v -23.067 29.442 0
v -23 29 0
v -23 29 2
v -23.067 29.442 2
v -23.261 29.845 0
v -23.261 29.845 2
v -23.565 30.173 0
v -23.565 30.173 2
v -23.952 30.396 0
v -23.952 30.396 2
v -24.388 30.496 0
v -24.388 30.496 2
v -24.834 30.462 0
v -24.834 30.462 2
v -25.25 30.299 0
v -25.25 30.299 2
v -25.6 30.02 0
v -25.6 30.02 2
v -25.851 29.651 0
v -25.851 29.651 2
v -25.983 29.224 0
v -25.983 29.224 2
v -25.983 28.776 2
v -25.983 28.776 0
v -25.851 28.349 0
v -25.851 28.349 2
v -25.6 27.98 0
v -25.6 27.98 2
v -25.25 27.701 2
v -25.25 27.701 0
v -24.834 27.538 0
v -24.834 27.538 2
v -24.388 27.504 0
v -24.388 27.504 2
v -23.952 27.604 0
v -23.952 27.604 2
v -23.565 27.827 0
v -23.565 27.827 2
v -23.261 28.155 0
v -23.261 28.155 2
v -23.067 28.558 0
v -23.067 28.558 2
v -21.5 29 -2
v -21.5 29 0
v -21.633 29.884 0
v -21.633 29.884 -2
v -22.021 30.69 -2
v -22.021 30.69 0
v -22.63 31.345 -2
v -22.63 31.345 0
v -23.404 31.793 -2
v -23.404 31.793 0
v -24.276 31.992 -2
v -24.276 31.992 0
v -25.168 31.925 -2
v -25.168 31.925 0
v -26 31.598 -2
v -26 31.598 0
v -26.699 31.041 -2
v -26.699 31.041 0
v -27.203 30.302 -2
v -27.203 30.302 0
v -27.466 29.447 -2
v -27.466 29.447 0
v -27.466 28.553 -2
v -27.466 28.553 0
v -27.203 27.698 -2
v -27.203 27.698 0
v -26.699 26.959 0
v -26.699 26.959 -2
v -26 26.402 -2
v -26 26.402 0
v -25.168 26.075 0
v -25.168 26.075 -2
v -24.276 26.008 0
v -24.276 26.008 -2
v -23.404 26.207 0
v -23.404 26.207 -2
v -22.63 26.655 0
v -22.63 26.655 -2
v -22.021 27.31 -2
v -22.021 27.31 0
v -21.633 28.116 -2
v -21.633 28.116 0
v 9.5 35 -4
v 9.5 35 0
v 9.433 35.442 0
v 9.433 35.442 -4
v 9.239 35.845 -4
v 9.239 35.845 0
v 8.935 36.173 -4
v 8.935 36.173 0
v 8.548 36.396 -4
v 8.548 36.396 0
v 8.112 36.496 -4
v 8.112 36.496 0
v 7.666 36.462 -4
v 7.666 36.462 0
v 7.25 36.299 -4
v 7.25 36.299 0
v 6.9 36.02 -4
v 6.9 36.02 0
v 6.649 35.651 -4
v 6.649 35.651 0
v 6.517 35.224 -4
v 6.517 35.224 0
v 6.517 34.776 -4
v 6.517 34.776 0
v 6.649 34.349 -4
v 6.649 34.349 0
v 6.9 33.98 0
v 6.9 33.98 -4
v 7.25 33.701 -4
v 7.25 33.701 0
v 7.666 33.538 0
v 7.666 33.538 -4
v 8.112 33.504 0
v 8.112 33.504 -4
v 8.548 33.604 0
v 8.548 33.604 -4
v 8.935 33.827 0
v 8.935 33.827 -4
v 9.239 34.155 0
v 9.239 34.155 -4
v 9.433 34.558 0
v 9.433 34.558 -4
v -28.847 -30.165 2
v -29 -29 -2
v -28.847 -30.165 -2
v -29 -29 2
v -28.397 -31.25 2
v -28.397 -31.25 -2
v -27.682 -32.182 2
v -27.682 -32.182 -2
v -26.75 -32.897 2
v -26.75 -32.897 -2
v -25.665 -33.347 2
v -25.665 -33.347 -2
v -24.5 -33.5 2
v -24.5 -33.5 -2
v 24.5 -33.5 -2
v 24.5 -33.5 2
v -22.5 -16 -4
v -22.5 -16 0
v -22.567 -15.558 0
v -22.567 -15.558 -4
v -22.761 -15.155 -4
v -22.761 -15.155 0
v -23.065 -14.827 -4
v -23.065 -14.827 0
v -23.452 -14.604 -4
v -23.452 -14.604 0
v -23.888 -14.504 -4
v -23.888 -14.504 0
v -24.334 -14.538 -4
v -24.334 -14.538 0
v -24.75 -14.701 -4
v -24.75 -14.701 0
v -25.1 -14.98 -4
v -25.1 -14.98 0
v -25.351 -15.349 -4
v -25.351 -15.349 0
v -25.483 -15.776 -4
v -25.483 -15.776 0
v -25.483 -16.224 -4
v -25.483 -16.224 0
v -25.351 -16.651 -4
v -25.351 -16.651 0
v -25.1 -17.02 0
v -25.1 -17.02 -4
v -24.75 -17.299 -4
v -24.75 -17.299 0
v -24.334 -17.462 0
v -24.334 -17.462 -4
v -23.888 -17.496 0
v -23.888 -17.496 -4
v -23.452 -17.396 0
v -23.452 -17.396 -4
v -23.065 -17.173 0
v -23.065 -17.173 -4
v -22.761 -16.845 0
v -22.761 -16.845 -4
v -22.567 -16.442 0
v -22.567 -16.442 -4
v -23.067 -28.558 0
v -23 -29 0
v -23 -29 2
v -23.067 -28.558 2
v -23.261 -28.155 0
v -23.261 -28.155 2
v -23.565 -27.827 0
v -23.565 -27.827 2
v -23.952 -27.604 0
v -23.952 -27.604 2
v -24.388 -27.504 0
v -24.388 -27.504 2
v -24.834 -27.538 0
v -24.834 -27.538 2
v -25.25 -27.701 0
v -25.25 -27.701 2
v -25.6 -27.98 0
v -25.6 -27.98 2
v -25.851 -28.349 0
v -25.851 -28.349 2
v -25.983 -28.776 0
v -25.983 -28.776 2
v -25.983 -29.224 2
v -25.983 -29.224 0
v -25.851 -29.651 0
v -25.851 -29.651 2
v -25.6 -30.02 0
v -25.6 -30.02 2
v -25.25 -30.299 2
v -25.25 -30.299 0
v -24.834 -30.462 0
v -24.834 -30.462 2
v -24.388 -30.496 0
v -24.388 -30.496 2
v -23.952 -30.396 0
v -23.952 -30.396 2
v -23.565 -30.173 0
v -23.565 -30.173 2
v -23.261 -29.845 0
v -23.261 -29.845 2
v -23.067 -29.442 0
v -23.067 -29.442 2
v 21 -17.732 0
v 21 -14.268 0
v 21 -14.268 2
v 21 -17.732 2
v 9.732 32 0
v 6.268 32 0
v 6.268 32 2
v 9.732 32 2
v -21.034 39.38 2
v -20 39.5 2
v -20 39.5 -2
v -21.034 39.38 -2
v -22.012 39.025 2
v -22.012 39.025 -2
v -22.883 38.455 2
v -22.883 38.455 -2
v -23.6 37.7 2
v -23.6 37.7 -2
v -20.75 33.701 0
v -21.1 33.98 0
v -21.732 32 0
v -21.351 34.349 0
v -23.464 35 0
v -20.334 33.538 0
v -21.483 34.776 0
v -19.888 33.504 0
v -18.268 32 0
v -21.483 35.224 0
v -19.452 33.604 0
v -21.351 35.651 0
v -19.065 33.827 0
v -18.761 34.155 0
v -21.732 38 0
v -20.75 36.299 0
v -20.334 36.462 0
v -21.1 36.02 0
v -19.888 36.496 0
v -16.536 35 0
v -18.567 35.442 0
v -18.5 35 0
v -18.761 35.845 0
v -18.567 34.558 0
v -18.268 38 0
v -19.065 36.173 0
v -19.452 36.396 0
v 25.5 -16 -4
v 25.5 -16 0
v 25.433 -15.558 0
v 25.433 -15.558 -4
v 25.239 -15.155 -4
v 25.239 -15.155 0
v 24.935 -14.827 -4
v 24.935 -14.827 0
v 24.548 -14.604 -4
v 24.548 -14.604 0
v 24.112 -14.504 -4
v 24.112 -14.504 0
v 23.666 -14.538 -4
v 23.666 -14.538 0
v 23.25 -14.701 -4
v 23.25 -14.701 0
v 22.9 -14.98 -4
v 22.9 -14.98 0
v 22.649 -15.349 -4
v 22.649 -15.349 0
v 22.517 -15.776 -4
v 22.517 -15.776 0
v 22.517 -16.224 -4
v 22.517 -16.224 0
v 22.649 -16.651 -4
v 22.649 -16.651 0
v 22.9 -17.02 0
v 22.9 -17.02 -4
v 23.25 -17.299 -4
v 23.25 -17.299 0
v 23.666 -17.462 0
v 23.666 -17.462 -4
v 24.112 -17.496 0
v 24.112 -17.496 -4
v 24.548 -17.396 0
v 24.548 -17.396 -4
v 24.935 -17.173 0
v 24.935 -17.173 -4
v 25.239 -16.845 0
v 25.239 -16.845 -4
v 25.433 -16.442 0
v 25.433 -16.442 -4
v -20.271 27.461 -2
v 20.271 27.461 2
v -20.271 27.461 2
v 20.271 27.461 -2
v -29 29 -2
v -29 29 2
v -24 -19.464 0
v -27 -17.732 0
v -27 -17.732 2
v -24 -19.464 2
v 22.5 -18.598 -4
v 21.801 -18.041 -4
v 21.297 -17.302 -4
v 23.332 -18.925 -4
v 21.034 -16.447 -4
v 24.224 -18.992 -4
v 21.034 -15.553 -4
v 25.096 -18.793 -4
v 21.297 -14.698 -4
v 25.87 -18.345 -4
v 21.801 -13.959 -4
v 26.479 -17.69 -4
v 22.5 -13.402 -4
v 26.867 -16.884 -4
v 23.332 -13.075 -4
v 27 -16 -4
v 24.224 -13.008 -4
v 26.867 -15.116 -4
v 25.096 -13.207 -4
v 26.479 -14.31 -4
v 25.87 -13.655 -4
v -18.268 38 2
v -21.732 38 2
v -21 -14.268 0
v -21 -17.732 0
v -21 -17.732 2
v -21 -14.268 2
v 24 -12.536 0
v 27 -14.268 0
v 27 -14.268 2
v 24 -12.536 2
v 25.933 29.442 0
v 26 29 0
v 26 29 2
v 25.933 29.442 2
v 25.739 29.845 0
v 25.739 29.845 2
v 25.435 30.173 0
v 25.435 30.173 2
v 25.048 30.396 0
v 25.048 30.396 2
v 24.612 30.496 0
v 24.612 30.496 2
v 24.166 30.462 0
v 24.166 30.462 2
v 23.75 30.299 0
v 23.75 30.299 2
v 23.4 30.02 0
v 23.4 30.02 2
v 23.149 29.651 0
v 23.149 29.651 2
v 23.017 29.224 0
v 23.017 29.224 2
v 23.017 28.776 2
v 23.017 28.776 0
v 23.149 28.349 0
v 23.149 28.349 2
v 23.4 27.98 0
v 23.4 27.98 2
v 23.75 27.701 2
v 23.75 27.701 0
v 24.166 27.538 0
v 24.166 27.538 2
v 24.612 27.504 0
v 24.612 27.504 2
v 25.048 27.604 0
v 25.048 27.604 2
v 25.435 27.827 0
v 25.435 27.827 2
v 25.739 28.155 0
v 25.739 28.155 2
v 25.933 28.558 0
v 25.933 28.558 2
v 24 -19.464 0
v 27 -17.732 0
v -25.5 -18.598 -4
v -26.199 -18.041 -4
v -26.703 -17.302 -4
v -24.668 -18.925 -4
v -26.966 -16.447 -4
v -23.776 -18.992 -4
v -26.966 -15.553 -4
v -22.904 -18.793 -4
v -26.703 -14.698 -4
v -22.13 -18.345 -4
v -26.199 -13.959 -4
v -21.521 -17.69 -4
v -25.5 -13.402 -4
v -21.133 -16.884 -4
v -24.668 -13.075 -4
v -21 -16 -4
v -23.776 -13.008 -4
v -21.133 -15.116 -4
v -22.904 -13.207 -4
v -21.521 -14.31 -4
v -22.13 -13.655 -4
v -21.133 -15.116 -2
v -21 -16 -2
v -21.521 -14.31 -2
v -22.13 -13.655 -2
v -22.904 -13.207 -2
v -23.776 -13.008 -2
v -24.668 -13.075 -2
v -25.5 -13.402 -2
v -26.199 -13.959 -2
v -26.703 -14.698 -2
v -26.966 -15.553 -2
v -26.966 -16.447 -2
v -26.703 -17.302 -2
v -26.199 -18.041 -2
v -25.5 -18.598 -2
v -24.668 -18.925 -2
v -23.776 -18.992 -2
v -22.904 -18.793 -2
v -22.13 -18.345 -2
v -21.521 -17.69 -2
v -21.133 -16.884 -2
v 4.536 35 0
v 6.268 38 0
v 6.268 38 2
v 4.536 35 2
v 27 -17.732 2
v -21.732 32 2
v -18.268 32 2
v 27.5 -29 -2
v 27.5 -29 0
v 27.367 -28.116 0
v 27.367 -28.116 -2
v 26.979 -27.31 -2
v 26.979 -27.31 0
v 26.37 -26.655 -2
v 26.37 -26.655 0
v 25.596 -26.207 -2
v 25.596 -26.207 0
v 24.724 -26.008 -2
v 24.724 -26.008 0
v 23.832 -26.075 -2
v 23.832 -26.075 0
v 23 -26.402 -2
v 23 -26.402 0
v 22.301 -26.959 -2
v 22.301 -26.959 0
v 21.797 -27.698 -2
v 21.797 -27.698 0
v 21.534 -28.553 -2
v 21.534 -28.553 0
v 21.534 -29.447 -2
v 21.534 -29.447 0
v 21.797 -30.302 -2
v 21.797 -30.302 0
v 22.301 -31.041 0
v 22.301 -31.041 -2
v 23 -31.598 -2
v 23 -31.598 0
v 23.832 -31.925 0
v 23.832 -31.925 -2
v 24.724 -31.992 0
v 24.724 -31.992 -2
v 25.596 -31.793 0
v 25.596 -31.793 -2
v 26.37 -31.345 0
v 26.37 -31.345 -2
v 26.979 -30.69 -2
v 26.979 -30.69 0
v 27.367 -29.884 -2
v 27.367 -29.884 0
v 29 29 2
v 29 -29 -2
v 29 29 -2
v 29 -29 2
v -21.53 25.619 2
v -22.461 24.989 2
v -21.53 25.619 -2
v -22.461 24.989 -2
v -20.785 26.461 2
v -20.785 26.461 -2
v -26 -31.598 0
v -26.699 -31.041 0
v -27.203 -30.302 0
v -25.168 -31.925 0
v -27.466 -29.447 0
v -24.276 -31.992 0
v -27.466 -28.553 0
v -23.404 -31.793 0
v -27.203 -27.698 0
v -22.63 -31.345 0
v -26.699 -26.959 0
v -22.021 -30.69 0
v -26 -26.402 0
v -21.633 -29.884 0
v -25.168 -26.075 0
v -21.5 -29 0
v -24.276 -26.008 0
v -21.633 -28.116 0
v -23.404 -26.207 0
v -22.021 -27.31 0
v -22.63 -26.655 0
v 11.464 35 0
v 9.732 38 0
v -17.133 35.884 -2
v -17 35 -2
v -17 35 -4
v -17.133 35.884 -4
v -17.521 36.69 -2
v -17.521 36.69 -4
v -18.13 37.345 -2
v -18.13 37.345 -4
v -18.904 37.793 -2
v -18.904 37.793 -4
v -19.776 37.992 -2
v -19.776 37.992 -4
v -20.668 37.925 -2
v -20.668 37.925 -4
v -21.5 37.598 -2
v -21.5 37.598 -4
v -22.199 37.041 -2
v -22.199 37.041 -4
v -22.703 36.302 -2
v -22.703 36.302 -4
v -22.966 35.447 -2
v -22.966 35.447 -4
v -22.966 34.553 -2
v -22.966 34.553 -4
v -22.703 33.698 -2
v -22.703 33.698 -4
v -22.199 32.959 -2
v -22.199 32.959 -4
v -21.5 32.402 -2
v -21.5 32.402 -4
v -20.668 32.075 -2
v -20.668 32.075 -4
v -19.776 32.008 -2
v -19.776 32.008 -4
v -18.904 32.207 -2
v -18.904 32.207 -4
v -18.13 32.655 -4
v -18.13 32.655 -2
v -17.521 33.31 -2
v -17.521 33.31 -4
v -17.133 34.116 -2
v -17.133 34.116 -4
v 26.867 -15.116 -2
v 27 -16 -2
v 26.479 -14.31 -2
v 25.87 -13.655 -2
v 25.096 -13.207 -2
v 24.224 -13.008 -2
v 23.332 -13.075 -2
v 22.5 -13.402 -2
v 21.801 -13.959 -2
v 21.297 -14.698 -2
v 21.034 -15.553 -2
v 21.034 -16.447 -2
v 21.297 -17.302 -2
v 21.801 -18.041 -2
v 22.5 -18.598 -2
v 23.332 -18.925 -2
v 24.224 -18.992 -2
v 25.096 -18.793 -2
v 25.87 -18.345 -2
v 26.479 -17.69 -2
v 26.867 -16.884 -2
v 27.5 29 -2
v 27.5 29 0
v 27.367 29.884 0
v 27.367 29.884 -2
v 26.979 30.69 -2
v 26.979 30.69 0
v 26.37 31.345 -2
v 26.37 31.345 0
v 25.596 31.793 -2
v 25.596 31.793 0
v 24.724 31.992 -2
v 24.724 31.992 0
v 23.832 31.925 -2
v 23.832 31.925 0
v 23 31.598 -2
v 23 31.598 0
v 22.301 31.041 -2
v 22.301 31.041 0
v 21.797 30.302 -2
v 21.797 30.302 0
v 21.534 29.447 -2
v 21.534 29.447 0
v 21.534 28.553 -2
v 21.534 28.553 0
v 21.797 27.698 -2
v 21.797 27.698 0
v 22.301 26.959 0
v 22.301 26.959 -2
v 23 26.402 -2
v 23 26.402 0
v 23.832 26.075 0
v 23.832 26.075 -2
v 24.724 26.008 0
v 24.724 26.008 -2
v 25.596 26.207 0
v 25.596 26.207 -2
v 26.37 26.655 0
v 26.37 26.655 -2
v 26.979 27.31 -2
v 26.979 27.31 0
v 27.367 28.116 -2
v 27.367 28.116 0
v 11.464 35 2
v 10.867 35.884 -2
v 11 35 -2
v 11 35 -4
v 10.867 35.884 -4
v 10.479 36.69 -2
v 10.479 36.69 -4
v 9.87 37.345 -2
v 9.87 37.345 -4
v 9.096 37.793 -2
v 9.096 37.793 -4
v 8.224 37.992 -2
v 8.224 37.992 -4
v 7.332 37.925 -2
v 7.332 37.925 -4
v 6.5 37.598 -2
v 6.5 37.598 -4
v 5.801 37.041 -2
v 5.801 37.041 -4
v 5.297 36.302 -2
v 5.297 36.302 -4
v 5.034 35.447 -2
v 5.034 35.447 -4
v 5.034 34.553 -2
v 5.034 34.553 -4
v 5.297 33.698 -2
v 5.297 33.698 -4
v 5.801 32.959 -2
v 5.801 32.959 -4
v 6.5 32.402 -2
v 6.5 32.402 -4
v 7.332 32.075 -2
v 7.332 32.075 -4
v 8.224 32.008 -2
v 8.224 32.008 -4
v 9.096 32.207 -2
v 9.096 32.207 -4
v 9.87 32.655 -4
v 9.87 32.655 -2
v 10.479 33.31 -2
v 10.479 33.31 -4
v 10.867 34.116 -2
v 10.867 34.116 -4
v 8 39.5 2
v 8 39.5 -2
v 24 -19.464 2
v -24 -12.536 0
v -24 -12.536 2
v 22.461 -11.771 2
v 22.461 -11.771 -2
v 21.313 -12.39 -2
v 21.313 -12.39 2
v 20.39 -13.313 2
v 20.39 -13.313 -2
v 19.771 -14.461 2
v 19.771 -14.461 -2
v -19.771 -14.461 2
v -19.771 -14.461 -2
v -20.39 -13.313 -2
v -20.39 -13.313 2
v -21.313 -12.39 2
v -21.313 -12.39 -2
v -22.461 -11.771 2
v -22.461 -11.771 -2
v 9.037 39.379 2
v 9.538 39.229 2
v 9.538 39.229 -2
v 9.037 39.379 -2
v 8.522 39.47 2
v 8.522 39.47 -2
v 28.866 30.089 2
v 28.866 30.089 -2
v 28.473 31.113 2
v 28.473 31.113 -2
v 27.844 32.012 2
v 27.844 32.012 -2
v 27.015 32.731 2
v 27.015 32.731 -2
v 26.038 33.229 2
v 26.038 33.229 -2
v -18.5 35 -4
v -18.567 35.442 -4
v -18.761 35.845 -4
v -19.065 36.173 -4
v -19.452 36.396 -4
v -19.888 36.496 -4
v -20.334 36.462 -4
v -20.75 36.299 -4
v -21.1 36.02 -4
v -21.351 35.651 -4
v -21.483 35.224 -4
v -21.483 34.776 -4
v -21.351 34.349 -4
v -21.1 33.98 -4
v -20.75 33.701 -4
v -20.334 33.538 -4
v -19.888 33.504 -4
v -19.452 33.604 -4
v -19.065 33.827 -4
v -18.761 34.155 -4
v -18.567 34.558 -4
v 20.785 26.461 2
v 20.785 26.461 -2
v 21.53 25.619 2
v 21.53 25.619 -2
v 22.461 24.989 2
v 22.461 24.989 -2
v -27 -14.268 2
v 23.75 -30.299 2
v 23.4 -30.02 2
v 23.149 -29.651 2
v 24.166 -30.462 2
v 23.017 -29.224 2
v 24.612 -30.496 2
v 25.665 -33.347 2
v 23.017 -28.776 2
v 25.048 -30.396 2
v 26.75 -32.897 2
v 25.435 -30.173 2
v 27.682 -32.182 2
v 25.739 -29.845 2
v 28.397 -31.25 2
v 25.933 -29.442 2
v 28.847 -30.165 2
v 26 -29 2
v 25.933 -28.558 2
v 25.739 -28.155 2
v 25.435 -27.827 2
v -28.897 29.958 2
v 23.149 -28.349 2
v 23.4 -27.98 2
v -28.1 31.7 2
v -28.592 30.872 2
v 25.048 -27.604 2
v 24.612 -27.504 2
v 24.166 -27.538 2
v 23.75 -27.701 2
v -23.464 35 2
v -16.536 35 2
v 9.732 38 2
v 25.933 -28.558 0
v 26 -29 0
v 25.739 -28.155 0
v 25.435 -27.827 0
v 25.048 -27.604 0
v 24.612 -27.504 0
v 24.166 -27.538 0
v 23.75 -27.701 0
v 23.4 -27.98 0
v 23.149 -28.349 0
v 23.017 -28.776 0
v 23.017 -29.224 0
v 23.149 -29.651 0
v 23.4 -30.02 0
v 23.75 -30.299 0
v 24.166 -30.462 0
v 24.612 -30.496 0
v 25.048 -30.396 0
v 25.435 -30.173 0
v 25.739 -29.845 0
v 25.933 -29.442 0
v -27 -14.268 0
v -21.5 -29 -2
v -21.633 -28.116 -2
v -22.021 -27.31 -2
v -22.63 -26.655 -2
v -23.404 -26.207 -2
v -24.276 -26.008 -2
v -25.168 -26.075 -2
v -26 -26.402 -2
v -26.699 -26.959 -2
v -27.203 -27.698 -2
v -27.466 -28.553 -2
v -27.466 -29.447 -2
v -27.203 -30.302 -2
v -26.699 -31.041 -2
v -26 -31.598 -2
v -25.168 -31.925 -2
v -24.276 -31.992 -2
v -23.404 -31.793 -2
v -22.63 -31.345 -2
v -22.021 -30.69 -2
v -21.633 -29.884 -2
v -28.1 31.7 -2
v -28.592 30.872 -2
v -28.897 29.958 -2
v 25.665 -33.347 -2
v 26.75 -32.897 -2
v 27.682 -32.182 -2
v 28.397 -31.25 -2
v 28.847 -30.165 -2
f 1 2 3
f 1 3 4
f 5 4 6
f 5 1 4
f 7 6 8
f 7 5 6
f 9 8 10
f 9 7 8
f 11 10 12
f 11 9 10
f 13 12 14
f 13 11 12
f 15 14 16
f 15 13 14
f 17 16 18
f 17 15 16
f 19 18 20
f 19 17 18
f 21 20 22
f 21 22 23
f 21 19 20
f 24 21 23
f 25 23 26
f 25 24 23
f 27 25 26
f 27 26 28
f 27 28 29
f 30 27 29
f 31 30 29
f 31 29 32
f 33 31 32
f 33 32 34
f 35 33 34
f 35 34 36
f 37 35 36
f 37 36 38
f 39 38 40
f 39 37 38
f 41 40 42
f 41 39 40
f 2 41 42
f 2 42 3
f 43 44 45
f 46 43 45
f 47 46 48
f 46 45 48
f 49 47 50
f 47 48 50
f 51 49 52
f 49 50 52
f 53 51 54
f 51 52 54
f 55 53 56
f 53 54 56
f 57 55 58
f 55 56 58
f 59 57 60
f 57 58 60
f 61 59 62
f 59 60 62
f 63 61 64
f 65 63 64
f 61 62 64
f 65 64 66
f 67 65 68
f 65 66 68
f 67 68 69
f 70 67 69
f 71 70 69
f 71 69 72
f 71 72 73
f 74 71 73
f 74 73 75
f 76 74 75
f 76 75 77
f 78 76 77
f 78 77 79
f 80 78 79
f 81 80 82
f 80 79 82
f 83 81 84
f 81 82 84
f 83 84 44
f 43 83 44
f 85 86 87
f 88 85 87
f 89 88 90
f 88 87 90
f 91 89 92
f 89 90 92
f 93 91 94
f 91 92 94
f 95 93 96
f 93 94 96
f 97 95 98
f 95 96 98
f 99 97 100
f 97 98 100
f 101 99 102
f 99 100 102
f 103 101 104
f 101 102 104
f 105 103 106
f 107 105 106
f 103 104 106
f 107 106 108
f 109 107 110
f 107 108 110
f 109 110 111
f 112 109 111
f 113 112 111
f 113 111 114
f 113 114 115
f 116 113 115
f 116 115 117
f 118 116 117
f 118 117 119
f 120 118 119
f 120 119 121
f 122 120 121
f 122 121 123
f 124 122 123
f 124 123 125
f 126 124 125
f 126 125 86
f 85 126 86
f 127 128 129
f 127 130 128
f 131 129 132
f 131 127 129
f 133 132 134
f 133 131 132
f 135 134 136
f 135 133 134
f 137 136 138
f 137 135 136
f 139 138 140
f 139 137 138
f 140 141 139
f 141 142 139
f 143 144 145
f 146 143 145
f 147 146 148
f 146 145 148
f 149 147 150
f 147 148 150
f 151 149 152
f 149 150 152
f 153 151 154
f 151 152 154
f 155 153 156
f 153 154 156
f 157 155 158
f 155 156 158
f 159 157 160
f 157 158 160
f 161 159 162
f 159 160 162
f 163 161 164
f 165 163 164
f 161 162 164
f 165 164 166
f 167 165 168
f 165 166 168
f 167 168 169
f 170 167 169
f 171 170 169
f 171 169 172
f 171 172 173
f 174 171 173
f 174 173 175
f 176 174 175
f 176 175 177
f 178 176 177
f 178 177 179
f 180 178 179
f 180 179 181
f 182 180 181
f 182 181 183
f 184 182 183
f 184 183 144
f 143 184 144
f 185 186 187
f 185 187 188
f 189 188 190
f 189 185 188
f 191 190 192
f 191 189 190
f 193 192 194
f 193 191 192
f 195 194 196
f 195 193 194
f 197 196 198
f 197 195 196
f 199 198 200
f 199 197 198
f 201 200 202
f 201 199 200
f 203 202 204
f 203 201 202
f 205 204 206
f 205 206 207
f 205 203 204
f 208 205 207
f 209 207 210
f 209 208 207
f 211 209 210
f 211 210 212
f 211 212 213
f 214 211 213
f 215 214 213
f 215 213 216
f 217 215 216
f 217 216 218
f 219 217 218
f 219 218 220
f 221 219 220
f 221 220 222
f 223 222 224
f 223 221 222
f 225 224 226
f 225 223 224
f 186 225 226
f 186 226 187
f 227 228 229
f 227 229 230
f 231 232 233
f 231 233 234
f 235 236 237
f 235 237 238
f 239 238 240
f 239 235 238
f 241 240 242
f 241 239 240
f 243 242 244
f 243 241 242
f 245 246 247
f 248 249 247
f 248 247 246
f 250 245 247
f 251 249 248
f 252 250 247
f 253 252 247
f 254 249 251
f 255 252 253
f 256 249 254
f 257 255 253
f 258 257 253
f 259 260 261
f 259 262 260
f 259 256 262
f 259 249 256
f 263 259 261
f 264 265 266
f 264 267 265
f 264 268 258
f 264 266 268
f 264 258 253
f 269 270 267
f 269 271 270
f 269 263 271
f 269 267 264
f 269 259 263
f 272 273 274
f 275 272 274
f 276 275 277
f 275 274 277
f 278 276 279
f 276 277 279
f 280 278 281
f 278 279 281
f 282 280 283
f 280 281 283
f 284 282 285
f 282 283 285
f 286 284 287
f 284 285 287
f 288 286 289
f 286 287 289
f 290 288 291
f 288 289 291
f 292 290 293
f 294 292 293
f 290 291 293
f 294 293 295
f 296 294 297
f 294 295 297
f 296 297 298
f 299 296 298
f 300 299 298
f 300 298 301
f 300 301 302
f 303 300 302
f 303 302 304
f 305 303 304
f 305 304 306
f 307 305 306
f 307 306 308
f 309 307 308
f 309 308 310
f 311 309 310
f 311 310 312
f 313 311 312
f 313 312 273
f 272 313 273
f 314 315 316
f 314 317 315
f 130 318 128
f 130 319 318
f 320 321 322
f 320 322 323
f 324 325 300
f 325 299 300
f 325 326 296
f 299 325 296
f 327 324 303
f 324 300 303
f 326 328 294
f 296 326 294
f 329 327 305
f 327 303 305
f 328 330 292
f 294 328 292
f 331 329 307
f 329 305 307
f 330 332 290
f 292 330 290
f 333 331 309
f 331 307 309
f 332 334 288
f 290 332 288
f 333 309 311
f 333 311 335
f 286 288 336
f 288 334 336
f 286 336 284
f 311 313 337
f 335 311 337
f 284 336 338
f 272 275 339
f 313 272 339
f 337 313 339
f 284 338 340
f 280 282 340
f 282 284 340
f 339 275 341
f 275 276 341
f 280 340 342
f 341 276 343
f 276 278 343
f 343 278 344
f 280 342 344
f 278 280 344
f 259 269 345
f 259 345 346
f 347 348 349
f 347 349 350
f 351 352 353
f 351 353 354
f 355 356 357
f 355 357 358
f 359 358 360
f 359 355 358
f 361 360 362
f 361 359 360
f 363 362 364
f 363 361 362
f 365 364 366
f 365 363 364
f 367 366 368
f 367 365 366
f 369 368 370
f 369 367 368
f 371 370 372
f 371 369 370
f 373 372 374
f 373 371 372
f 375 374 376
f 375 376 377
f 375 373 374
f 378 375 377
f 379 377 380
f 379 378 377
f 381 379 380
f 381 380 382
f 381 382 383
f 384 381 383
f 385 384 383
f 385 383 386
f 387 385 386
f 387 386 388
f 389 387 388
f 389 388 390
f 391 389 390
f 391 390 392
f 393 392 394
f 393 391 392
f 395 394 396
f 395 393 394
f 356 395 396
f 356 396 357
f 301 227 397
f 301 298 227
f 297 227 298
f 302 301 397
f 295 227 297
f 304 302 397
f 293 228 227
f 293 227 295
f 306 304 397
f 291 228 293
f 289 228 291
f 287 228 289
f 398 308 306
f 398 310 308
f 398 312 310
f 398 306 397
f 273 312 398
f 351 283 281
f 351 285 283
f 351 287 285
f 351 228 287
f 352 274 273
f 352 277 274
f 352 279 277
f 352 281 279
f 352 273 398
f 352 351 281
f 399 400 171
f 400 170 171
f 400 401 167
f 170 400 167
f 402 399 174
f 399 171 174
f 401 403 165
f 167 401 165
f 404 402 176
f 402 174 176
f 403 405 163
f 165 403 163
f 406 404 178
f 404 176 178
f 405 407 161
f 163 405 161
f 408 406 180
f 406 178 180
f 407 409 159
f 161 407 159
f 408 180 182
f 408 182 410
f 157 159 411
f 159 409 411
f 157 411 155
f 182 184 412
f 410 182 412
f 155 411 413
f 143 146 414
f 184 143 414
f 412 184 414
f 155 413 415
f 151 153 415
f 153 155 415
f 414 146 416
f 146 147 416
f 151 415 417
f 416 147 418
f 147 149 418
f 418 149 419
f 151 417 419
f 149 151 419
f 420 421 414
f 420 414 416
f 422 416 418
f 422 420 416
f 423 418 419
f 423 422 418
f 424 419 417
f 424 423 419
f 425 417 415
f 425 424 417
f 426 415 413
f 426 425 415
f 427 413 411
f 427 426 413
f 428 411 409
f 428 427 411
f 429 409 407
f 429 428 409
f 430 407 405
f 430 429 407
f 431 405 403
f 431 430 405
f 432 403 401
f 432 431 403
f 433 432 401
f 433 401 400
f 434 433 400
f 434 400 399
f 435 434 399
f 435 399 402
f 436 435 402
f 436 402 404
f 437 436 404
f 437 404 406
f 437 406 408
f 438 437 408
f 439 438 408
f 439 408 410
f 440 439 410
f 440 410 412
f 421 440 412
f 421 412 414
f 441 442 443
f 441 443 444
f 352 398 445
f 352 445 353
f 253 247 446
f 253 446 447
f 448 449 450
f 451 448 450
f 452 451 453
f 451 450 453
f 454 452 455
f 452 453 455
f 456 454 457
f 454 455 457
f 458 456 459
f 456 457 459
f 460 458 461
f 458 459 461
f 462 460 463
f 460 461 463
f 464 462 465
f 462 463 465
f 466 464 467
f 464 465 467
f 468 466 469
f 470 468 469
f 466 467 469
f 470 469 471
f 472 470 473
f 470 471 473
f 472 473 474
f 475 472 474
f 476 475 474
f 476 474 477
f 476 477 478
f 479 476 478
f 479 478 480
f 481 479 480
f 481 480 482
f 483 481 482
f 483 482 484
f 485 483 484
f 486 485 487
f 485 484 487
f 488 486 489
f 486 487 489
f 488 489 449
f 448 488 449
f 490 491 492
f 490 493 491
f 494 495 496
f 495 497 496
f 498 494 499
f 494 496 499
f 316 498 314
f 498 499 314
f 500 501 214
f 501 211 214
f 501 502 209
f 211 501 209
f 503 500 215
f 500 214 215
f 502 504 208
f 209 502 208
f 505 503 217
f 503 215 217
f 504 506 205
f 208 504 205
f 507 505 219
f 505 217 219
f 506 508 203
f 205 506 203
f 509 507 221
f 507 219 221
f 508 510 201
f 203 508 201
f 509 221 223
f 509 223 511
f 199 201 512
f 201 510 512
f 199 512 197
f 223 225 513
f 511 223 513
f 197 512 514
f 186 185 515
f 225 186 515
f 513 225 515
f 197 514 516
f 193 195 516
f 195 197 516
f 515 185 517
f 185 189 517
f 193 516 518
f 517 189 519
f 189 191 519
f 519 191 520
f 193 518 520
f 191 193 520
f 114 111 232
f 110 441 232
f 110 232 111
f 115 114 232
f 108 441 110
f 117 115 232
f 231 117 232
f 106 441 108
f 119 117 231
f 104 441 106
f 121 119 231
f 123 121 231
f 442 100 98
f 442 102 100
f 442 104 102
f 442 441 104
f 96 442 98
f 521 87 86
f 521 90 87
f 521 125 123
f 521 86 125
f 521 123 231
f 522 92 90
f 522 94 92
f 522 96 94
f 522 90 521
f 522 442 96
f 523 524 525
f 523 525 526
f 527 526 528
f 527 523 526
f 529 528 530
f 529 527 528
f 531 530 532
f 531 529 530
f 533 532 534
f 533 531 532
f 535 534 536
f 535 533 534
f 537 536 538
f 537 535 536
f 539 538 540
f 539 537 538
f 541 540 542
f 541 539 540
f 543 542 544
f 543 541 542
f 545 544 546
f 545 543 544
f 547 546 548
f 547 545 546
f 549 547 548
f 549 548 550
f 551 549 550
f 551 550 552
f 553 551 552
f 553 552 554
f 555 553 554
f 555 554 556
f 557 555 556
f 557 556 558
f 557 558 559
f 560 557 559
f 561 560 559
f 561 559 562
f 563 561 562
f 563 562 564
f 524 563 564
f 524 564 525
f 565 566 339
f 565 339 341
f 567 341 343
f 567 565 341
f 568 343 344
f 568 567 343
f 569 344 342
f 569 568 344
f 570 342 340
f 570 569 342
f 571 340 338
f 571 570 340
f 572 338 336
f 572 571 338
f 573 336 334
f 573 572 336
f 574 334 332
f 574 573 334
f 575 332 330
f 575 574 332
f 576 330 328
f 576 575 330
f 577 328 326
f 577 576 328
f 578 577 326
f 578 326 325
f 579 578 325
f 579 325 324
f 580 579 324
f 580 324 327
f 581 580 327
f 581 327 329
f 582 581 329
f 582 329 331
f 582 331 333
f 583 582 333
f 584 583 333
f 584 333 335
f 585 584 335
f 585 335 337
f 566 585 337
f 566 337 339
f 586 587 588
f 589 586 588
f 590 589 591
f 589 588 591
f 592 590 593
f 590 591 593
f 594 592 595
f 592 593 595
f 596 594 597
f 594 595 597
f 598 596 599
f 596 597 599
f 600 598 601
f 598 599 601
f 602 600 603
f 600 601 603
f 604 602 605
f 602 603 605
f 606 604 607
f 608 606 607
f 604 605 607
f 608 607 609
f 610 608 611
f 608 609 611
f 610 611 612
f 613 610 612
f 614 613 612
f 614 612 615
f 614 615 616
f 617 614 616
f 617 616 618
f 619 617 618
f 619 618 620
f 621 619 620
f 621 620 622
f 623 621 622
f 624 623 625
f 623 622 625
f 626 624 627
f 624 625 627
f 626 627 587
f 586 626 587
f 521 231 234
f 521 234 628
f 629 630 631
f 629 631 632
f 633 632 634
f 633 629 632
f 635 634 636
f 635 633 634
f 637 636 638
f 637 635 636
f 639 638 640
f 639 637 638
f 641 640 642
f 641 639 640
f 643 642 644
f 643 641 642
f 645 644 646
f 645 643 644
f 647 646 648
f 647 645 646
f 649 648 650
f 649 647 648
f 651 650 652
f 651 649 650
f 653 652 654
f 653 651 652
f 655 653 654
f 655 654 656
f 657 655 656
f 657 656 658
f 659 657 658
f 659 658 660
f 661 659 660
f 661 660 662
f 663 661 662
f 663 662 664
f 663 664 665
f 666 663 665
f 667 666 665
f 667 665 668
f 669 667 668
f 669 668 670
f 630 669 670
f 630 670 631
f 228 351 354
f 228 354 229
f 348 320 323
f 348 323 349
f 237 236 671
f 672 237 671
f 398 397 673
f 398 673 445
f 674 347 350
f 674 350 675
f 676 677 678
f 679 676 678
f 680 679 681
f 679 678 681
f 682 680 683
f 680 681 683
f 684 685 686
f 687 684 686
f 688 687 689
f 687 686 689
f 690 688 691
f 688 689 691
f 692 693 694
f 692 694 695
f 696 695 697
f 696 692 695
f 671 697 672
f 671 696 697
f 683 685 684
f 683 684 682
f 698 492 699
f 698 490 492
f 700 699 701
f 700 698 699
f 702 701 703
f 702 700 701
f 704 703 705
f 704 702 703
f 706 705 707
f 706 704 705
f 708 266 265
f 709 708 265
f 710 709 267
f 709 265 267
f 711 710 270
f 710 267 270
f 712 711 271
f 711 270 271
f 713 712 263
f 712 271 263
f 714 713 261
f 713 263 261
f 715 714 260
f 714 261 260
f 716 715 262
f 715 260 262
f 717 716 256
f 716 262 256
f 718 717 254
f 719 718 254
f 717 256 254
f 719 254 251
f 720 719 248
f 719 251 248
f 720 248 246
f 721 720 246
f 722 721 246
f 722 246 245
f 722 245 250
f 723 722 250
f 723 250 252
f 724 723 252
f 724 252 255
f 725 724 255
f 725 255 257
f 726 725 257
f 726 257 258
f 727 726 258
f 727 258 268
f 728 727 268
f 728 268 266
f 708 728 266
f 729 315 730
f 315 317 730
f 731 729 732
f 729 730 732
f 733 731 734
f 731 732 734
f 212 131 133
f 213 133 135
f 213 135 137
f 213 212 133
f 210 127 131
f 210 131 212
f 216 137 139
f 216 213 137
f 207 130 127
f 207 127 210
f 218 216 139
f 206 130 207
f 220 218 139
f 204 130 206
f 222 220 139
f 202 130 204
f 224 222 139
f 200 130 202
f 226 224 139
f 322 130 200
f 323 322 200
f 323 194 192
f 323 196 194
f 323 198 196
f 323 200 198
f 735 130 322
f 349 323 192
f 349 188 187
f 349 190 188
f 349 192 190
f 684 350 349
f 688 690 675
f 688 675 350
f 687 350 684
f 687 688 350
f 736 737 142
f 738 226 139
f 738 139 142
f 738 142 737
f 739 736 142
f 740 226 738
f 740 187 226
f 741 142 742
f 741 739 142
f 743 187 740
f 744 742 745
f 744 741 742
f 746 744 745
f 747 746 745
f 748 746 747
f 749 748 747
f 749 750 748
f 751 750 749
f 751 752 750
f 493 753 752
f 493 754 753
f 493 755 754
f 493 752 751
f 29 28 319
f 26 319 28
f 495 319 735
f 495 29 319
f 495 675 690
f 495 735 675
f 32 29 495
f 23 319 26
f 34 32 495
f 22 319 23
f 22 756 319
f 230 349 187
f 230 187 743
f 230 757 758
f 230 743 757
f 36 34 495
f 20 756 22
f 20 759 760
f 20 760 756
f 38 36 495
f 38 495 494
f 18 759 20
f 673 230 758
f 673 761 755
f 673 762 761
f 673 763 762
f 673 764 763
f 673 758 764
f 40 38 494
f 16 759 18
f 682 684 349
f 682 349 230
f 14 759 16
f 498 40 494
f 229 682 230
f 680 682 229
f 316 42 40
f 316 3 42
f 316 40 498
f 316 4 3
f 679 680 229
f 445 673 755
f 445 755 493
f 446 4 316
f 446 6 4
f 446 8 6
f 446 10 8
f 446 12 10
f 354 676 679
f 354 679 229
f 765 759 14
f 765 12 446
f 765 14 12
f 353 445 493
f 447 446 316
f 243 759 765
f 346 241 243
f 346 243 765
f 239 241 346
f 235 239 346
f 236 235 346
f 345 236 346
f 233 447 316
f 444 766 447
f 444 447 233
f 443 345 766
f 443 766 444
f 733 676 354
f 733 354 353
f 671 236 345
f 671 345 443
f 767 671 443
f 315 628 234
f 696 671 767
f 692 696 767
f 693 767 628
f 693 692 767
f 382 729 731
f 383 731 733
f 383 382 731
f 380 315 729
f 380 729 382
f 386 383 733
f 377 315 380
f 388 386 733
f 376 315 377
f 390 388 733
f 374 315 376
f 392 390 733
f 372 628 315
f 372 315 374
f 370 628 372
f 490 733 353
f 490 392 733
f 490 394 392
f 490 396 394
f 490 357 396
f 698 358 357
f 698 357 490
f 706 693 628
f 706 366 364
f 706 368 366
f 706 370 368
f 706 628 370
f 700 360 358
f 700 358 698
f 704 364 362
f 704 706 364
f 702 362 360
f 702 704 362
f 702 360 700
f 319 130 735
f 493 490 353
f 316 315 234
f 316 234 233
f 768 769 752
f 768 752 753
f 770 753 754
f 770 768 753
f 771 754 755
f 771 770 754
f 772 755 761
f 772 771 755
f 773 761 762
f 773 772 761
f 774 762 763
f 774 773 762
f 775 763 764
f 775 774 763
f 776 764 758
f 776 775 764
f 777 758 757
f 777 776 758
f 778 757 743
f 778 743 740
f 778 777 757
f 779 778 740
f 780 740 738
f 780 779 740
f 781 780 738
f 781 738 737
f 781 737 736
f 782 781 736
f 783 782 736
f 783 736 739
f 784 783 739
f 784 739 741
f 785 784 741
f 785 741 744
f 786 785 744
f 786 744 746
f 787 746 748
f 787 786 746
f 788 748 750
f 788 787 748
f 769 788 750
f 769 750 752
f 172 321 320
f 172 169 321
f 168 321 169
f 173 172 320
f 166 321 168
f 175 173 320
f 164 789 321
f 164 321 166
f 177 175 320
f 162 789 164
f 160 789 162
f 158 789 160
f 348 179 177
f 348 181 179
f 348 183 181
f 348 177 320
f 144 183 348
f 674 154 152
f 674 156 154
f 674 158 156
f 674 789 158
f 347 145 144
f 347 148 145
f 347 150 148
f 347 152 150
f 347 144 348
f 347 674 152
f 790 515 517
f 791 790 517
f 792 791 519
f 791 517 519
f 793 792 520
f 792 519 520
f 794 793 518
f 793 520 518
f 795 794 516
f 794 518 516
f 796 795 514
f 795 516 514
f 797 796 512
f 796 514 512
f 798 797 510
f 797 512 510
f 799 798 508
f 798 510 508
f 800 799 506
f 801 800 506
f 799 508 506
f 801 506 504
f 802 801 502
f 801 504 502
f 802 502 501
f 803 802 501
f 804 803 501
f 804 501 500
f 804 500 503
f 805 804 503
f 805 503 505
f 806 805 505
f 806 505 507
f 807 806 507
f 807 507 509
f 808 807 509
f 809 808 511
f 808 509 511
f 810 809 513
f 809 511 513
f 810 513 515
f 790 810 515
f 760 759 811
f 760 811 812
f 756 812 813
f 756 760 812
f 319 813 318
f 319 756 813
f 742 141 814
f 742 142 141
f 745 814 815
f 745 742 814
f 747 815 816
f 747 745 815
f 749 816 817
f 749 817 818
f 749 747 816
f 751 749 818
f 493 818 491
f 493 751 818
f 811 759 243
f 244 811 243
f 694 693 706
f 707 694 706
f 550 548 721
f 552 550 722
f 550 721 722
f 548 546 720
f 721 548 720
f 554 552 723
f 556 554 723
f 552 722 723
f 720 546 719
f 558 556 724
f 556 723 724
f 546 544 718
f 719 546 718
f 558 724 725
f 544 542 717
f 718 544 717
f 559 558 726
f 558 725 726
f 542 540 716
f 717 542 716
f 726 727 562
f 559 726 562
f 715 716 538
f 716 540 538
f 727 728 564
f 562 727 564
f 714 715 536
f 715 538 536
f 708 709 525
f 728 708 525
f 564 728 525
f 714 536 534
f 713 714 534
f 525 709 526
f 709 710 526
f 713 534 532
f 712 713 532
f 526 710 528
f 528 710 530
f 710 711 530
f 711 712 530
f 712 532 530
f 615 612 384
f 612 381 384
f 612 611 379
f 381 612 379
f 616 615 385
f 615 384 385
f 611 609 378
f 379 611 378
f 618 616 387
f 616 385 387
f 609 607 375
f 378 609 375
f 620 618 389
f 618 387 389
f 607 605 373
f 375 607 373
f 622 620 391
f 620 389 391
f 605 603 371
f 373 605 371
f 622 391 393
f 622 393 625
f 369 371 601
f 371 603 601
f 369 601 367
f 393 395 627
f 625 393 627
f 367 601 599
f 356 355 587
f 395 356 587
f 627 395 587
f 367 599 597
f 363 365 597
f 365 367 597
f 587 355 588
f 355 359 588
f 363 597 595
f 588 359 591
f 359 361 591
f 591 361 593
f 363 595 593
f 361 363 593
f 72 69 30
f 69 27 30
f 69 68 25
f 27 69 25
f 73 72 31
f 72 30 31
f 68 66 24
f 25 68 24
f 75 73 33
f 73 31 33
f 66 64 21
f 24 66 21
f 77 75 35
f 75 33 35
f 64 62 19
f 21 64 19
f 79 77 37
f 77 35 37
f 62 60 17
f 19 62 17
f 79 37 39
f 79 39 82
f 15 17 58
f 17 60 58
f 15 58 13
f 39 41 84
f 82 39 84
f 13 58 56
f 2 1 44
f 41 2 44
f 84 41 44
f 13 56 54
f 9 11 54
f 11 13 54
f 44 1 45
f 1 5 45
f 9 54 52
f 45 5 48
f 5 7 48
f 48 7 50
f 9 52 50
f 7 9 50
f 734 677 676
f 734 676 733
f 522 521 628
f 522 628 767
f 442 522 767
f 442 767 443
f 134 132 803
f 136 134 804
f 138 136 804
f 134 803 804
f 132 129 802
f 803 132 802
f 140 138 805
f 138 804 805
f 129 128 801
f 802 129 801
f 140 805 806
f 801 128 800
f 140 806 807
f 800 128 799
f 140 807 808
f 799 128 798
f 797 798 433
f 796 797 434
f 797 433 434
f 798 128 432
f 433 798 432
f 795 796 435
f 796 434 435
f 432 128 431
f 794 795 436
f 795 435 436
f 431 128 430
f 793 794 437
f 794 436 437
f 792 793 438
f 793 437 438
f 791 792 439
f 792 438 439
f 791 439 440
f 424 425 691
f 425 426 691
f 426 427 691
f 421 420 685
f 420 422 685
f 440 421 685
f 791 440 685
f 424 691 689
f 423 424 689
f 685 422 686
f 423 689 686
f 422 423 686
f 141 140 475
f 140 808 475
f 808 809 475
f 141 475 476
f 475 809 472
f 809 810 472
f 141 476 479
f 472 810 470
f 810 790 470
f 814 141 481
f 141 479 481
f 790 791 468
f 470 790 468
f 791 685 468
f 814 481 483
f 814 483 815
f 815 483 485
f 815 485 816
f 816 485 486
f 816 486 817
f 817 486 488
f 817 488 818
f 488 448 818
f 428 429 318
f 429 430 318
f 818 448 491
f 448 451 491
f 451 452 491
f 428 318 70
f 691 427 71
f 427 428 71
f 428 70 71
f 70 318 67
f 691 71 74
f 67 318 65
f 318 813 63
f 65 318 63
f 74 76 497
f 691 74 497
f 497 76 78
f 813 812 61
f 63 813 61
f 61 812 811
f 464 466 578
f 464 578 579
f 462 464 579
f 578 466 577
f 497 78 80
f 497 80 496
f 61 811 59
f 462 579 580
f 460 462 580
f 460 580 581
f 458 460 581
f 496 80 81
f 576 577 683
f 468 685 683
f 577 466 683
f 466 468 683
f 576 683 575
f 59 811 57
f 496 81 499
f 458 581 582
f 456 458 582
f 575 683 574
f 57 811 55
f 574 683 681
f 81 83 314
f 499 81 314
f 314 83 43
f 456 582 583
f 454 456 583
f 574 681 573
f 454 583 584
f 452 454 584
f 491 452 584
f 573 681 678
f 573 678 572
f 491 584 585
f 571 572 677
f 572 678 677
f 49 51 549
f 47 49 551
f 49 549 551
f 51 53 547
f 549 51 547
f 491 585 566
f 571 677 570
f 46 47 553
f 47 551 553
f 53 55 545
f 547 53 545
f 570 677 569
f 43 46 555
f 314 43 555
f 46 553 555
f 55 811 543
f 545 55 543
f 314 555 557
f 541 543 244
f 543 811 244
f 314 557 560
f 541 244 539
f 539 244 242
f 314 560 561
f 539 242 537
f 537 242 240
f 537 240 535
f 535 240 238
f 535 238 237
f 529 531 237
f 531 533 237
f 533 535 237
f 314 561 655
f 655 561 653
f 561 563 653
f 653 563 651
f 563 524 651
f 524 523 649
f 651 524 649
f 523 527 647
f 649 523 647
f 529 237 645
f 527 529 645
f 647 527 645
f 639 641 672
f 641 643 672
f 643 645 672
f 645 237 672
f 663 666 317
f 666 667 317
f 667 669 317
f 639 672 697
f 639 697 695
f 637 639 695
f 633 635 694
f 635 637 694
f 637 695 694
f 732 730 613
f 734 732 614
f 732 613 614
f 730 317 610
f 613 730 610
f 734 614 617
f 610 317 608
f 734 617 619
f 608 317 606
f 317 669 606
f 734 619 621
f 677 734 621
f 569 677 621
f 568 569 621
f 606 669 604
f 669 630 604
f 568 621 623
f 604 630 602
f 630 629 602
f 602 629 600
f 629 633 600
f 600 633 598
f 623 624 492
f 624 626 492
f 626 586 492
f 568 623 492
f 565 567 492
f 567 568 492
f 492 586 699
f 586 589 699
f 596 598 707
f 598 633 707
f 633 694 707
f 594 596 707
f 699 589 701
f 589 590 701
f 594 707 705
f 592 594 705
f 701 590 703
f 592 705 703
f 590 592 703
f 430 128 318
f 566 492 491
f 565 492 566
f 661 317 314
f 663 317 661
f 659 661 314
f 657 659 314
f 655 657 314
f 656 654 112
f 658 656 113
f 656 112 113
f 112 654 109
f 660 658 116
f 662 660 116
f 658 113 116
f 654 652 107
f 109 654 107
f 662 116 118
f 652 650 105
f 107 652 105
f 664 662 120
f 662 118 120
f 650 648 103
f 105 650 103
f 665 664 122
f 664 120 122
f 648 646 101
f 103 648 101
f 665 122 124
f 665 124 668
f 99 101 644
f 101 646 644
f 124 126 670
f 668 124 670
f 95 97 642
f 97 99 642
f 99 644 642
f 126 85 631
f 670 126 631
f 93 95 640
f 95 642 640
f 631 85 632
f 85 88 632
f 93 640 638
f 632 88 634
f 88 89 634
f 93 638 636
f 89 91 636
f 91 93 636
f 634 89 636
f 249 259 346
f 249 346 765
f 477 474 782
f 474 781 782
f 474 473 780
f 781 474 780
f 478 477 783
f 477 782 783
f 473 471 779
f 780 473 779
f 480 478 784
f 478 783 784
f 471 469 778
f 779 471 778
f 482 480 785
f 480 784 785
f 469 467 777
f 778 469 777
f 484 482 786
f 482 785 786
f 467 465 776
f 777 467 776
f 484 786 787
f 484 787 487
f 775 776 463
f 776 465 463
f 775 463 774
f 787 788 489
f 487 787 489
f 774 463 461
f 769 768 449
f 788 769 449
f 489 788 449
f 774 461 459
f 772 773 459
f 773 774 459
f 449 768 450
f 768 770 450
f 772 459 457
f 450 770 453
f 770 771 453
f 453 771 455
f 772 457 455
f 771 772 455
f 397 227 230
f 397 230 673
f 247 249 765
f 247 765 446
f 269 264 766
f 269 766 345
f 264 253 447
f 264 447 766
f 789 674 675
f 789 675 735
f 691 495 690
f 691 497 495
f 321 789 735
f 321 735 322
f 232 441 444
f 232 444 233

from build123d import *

# Parameters (mm, degrees)
SKETCH_R        = 1.5
PAD_DEPTH       = 2
PAD_DEPTH_BACK  = 2
SKETCH001_R     = 3
SKETCH001_R_2   = 1.5
POCKET_DEPTH    = 2
SKETCH002_R     = 3
SKETCH002_R_2   = 1.5
PAD001_DEPTH    = 4
SKETCH003_R     = 1.5
POCKET001_DEPTH = 5


with BuildPart() as part:
    # Sketch → Pad (new body, two sides)
    with BuildSketch(Plane.XY) as pad_sk:
        with BuildLine():
            ThreePointArc((29, 29), (28.185804, 31.581637), (26.037844, 33.22907))
            Line((9.537844, 39.22907), (26.037844, 33.22907))
            ThreePointArc((9.537844, 39.22907), (8.780763, 39.43175), (8, 39.5))
            Line((-20, 39.5), (8, 39.5))
            ThreePointArc((-20, 39.5), (-22.012461, 39.024922), (-23.6, 37.7))
            Line((-28.1, 31.7), (-23.6, 37.7))
            ThreePointArc((-28.1, 31.7), (-28.769075, 30.423025), (-29, 29))
            Line((-29, 29), (-29, -29))
            ThreePointArc((-29, -29), (-27.68198, -32.181981), (-24.5, -33.5))
            Line((24.5, -33.5), (-24.5, -33.5))
            ThreePointArc((24.5, -33.5), (27.681981, -32.181981), (29, -29))
            Line((29, -29), (29, 29))
        make_face()
        with Locations((-24.5, 29)):
            Circle(SKETCH_R, mode=Mode.SUBTRACT)
        with Locations((-20, 35)):
            Circle(SKETCH_R, mode=Mode.SUBTRACT)
        with Locations((8, 35)):
            Circle(SKETCH_R, mode=Mode.SUBTRACT)
        with Locations((24.5, 29)):
            Circle(SKETCH_R, mode=Mode.SUBTRACT)
        with Locations((24.5, -29)):
            Circle(SKETCH_R, mode=Mode.SUBTRACT)
        with Locations((-24, -16)):
            Circle(SKETCH_R, mode=Mode.SUBTRACT)
        with Locations((-24.5, -29)):
            Circle(SKETCH_R, mode=Mode.SUBTRACT)
        with Locations((24, -16)):
            Circle(SKETCH_R, mode=Mode.SUBTRACT)
        with BuildLine():
            ThreePointArc((-22.460909, 24.988503), (-21.131137, 26.016585), (-20.271383, 27.460909))
            Line((20.271383, 27.460909), (-20.271383, 27.460909))
            ThreePointArc((20.271383, 27.460909), (21.131137, 26.016585), (22.460909, 24.988503))
            Line((22.460909, -11.771383), (22.460909, 24.988503))
            ThreePointArc((22.460909, -11.771383), (20.818019, -12.818019), (19.771383, -14.460909))
            Line((-19.771383, -14.460909), (19.771383, -14.460909))
            ThreePointArc((-19.771383, -14.460909), (-20.818019, -12.818019), (-22.460909, -11.771383))
            Line((-22.460909, 24.988503), (-22.460909, -11.771383))
        make_face(mode=Mode.SUBTRACT)
    extrude(amount=PAD_DEPTH)
    extrude(pad_sk.sketch, amount=-PAD_DEPTH_BACK)

    # Sketch001 → Pocket (cut)
    with BuildSketch(Plane.XY):
        with Locations((-24.5, -29)):
            Circle(SKETCH001_R)
        with Locations((-24.5, -29)):
            Circle(SKETCH001_R_2, mode=Mode.SUBTRACT)
        with Locations((24.5, -29)):
            Circle(SKETCH001_R)
        with Locations((24.5, -29)):
            Circle(SKETCH001_R_2, mode=Mode.SUBTRACT)
        with Locations((24.5, 29)):
            Circle(SKETCH001_R)
        with Locations((24.5, 29)):
            Circle(SKETCH001_R_2, mode=Mode.SUBTRACT)
        with Locations((-24.5, 29)):
            Circle(SKETCH001_R)
        with Locations((-24.5, 29)):
            Circle(SKETCH001_R_2, mode=Mode.SUBTRACT)
    extrude(amount=-POCKET_DEPTH, mode=Mode.SUBTRACT)

    # Sketch002 → Pad001 (join)
    with BuildSketch(Plane.XY):
        with Locations((-20, 35)):
            Circle(SKETCH002_R)
        with Locations((-20, 35)):
            Circle(SKETCH002_R_2, mode=Mode.SUBTRACT)
        with Locations((8, 35)):
            Circle(SKETCH002_R)
        with Locations((8, 35)):
            Circle(SKETCH002_R_2, mode=Mode.SUBTRACT)
        with Locations((24, -16)):
            Circle(SKETCH002_R)
        with Locations((24, -16)):
            Circle(SKETCH002_R_2, mode=Mode.SUBTRACT)
        with Locations((-24, -16)):
            Circle(SKETCH002_R)
        with Locations((-24, -16)):
            Circle(SKETCH002_R_2, mode=Mode.SUBTRACT)
    extrude(amount=-PAD001_DEPTH)

    # Sketch003 → Pocket001 (cut)
    with BuildSketch(Plane.XY):
        Polygon((-16.535898, 35), (-18.267949, 38), (-21.732051, 38), (-23.464102, 35), (-21.732051, 32), (-18.267949, 32), align=None)
        with Locations((-20, 35)):
            Circle(SKETCH003_R, mode=Mode.SUBTRACT)
        Polygon((11.464102, 35), (9.732051, 38), (6.267949, 38), (4.535898, 35), (6.267949, 32), (9.732051, 32), align=None)
        with Locations((8, 35)):
            Circle(SKETCH003_R, mode=Mode.SUBTRACT)
        Polygon((24, -19.464102), (27, -17.732051), (27, -14.267949), (24, -12.535898), (21, -14.267949), (21, -17.732051), align=None)
        with Locations((24, -16)):
            Circle(SKETCH003_R, mode=Mode.SUBTRACT)
        Polygon((-21, -17.732051), (-21, -14.267949), (-24, -12.535898), (-27, -14.267949), (-27, -17.732051), (-24, -19.464102), align=None)
        with Locations((-24, -16)):
            Circle(SKETCH003_R, mode=Mode.SUBTRACT)
    extrude(amount=POCKET001_DEPTH, mode=Mode.SUBTRACT)


solid = part.part
